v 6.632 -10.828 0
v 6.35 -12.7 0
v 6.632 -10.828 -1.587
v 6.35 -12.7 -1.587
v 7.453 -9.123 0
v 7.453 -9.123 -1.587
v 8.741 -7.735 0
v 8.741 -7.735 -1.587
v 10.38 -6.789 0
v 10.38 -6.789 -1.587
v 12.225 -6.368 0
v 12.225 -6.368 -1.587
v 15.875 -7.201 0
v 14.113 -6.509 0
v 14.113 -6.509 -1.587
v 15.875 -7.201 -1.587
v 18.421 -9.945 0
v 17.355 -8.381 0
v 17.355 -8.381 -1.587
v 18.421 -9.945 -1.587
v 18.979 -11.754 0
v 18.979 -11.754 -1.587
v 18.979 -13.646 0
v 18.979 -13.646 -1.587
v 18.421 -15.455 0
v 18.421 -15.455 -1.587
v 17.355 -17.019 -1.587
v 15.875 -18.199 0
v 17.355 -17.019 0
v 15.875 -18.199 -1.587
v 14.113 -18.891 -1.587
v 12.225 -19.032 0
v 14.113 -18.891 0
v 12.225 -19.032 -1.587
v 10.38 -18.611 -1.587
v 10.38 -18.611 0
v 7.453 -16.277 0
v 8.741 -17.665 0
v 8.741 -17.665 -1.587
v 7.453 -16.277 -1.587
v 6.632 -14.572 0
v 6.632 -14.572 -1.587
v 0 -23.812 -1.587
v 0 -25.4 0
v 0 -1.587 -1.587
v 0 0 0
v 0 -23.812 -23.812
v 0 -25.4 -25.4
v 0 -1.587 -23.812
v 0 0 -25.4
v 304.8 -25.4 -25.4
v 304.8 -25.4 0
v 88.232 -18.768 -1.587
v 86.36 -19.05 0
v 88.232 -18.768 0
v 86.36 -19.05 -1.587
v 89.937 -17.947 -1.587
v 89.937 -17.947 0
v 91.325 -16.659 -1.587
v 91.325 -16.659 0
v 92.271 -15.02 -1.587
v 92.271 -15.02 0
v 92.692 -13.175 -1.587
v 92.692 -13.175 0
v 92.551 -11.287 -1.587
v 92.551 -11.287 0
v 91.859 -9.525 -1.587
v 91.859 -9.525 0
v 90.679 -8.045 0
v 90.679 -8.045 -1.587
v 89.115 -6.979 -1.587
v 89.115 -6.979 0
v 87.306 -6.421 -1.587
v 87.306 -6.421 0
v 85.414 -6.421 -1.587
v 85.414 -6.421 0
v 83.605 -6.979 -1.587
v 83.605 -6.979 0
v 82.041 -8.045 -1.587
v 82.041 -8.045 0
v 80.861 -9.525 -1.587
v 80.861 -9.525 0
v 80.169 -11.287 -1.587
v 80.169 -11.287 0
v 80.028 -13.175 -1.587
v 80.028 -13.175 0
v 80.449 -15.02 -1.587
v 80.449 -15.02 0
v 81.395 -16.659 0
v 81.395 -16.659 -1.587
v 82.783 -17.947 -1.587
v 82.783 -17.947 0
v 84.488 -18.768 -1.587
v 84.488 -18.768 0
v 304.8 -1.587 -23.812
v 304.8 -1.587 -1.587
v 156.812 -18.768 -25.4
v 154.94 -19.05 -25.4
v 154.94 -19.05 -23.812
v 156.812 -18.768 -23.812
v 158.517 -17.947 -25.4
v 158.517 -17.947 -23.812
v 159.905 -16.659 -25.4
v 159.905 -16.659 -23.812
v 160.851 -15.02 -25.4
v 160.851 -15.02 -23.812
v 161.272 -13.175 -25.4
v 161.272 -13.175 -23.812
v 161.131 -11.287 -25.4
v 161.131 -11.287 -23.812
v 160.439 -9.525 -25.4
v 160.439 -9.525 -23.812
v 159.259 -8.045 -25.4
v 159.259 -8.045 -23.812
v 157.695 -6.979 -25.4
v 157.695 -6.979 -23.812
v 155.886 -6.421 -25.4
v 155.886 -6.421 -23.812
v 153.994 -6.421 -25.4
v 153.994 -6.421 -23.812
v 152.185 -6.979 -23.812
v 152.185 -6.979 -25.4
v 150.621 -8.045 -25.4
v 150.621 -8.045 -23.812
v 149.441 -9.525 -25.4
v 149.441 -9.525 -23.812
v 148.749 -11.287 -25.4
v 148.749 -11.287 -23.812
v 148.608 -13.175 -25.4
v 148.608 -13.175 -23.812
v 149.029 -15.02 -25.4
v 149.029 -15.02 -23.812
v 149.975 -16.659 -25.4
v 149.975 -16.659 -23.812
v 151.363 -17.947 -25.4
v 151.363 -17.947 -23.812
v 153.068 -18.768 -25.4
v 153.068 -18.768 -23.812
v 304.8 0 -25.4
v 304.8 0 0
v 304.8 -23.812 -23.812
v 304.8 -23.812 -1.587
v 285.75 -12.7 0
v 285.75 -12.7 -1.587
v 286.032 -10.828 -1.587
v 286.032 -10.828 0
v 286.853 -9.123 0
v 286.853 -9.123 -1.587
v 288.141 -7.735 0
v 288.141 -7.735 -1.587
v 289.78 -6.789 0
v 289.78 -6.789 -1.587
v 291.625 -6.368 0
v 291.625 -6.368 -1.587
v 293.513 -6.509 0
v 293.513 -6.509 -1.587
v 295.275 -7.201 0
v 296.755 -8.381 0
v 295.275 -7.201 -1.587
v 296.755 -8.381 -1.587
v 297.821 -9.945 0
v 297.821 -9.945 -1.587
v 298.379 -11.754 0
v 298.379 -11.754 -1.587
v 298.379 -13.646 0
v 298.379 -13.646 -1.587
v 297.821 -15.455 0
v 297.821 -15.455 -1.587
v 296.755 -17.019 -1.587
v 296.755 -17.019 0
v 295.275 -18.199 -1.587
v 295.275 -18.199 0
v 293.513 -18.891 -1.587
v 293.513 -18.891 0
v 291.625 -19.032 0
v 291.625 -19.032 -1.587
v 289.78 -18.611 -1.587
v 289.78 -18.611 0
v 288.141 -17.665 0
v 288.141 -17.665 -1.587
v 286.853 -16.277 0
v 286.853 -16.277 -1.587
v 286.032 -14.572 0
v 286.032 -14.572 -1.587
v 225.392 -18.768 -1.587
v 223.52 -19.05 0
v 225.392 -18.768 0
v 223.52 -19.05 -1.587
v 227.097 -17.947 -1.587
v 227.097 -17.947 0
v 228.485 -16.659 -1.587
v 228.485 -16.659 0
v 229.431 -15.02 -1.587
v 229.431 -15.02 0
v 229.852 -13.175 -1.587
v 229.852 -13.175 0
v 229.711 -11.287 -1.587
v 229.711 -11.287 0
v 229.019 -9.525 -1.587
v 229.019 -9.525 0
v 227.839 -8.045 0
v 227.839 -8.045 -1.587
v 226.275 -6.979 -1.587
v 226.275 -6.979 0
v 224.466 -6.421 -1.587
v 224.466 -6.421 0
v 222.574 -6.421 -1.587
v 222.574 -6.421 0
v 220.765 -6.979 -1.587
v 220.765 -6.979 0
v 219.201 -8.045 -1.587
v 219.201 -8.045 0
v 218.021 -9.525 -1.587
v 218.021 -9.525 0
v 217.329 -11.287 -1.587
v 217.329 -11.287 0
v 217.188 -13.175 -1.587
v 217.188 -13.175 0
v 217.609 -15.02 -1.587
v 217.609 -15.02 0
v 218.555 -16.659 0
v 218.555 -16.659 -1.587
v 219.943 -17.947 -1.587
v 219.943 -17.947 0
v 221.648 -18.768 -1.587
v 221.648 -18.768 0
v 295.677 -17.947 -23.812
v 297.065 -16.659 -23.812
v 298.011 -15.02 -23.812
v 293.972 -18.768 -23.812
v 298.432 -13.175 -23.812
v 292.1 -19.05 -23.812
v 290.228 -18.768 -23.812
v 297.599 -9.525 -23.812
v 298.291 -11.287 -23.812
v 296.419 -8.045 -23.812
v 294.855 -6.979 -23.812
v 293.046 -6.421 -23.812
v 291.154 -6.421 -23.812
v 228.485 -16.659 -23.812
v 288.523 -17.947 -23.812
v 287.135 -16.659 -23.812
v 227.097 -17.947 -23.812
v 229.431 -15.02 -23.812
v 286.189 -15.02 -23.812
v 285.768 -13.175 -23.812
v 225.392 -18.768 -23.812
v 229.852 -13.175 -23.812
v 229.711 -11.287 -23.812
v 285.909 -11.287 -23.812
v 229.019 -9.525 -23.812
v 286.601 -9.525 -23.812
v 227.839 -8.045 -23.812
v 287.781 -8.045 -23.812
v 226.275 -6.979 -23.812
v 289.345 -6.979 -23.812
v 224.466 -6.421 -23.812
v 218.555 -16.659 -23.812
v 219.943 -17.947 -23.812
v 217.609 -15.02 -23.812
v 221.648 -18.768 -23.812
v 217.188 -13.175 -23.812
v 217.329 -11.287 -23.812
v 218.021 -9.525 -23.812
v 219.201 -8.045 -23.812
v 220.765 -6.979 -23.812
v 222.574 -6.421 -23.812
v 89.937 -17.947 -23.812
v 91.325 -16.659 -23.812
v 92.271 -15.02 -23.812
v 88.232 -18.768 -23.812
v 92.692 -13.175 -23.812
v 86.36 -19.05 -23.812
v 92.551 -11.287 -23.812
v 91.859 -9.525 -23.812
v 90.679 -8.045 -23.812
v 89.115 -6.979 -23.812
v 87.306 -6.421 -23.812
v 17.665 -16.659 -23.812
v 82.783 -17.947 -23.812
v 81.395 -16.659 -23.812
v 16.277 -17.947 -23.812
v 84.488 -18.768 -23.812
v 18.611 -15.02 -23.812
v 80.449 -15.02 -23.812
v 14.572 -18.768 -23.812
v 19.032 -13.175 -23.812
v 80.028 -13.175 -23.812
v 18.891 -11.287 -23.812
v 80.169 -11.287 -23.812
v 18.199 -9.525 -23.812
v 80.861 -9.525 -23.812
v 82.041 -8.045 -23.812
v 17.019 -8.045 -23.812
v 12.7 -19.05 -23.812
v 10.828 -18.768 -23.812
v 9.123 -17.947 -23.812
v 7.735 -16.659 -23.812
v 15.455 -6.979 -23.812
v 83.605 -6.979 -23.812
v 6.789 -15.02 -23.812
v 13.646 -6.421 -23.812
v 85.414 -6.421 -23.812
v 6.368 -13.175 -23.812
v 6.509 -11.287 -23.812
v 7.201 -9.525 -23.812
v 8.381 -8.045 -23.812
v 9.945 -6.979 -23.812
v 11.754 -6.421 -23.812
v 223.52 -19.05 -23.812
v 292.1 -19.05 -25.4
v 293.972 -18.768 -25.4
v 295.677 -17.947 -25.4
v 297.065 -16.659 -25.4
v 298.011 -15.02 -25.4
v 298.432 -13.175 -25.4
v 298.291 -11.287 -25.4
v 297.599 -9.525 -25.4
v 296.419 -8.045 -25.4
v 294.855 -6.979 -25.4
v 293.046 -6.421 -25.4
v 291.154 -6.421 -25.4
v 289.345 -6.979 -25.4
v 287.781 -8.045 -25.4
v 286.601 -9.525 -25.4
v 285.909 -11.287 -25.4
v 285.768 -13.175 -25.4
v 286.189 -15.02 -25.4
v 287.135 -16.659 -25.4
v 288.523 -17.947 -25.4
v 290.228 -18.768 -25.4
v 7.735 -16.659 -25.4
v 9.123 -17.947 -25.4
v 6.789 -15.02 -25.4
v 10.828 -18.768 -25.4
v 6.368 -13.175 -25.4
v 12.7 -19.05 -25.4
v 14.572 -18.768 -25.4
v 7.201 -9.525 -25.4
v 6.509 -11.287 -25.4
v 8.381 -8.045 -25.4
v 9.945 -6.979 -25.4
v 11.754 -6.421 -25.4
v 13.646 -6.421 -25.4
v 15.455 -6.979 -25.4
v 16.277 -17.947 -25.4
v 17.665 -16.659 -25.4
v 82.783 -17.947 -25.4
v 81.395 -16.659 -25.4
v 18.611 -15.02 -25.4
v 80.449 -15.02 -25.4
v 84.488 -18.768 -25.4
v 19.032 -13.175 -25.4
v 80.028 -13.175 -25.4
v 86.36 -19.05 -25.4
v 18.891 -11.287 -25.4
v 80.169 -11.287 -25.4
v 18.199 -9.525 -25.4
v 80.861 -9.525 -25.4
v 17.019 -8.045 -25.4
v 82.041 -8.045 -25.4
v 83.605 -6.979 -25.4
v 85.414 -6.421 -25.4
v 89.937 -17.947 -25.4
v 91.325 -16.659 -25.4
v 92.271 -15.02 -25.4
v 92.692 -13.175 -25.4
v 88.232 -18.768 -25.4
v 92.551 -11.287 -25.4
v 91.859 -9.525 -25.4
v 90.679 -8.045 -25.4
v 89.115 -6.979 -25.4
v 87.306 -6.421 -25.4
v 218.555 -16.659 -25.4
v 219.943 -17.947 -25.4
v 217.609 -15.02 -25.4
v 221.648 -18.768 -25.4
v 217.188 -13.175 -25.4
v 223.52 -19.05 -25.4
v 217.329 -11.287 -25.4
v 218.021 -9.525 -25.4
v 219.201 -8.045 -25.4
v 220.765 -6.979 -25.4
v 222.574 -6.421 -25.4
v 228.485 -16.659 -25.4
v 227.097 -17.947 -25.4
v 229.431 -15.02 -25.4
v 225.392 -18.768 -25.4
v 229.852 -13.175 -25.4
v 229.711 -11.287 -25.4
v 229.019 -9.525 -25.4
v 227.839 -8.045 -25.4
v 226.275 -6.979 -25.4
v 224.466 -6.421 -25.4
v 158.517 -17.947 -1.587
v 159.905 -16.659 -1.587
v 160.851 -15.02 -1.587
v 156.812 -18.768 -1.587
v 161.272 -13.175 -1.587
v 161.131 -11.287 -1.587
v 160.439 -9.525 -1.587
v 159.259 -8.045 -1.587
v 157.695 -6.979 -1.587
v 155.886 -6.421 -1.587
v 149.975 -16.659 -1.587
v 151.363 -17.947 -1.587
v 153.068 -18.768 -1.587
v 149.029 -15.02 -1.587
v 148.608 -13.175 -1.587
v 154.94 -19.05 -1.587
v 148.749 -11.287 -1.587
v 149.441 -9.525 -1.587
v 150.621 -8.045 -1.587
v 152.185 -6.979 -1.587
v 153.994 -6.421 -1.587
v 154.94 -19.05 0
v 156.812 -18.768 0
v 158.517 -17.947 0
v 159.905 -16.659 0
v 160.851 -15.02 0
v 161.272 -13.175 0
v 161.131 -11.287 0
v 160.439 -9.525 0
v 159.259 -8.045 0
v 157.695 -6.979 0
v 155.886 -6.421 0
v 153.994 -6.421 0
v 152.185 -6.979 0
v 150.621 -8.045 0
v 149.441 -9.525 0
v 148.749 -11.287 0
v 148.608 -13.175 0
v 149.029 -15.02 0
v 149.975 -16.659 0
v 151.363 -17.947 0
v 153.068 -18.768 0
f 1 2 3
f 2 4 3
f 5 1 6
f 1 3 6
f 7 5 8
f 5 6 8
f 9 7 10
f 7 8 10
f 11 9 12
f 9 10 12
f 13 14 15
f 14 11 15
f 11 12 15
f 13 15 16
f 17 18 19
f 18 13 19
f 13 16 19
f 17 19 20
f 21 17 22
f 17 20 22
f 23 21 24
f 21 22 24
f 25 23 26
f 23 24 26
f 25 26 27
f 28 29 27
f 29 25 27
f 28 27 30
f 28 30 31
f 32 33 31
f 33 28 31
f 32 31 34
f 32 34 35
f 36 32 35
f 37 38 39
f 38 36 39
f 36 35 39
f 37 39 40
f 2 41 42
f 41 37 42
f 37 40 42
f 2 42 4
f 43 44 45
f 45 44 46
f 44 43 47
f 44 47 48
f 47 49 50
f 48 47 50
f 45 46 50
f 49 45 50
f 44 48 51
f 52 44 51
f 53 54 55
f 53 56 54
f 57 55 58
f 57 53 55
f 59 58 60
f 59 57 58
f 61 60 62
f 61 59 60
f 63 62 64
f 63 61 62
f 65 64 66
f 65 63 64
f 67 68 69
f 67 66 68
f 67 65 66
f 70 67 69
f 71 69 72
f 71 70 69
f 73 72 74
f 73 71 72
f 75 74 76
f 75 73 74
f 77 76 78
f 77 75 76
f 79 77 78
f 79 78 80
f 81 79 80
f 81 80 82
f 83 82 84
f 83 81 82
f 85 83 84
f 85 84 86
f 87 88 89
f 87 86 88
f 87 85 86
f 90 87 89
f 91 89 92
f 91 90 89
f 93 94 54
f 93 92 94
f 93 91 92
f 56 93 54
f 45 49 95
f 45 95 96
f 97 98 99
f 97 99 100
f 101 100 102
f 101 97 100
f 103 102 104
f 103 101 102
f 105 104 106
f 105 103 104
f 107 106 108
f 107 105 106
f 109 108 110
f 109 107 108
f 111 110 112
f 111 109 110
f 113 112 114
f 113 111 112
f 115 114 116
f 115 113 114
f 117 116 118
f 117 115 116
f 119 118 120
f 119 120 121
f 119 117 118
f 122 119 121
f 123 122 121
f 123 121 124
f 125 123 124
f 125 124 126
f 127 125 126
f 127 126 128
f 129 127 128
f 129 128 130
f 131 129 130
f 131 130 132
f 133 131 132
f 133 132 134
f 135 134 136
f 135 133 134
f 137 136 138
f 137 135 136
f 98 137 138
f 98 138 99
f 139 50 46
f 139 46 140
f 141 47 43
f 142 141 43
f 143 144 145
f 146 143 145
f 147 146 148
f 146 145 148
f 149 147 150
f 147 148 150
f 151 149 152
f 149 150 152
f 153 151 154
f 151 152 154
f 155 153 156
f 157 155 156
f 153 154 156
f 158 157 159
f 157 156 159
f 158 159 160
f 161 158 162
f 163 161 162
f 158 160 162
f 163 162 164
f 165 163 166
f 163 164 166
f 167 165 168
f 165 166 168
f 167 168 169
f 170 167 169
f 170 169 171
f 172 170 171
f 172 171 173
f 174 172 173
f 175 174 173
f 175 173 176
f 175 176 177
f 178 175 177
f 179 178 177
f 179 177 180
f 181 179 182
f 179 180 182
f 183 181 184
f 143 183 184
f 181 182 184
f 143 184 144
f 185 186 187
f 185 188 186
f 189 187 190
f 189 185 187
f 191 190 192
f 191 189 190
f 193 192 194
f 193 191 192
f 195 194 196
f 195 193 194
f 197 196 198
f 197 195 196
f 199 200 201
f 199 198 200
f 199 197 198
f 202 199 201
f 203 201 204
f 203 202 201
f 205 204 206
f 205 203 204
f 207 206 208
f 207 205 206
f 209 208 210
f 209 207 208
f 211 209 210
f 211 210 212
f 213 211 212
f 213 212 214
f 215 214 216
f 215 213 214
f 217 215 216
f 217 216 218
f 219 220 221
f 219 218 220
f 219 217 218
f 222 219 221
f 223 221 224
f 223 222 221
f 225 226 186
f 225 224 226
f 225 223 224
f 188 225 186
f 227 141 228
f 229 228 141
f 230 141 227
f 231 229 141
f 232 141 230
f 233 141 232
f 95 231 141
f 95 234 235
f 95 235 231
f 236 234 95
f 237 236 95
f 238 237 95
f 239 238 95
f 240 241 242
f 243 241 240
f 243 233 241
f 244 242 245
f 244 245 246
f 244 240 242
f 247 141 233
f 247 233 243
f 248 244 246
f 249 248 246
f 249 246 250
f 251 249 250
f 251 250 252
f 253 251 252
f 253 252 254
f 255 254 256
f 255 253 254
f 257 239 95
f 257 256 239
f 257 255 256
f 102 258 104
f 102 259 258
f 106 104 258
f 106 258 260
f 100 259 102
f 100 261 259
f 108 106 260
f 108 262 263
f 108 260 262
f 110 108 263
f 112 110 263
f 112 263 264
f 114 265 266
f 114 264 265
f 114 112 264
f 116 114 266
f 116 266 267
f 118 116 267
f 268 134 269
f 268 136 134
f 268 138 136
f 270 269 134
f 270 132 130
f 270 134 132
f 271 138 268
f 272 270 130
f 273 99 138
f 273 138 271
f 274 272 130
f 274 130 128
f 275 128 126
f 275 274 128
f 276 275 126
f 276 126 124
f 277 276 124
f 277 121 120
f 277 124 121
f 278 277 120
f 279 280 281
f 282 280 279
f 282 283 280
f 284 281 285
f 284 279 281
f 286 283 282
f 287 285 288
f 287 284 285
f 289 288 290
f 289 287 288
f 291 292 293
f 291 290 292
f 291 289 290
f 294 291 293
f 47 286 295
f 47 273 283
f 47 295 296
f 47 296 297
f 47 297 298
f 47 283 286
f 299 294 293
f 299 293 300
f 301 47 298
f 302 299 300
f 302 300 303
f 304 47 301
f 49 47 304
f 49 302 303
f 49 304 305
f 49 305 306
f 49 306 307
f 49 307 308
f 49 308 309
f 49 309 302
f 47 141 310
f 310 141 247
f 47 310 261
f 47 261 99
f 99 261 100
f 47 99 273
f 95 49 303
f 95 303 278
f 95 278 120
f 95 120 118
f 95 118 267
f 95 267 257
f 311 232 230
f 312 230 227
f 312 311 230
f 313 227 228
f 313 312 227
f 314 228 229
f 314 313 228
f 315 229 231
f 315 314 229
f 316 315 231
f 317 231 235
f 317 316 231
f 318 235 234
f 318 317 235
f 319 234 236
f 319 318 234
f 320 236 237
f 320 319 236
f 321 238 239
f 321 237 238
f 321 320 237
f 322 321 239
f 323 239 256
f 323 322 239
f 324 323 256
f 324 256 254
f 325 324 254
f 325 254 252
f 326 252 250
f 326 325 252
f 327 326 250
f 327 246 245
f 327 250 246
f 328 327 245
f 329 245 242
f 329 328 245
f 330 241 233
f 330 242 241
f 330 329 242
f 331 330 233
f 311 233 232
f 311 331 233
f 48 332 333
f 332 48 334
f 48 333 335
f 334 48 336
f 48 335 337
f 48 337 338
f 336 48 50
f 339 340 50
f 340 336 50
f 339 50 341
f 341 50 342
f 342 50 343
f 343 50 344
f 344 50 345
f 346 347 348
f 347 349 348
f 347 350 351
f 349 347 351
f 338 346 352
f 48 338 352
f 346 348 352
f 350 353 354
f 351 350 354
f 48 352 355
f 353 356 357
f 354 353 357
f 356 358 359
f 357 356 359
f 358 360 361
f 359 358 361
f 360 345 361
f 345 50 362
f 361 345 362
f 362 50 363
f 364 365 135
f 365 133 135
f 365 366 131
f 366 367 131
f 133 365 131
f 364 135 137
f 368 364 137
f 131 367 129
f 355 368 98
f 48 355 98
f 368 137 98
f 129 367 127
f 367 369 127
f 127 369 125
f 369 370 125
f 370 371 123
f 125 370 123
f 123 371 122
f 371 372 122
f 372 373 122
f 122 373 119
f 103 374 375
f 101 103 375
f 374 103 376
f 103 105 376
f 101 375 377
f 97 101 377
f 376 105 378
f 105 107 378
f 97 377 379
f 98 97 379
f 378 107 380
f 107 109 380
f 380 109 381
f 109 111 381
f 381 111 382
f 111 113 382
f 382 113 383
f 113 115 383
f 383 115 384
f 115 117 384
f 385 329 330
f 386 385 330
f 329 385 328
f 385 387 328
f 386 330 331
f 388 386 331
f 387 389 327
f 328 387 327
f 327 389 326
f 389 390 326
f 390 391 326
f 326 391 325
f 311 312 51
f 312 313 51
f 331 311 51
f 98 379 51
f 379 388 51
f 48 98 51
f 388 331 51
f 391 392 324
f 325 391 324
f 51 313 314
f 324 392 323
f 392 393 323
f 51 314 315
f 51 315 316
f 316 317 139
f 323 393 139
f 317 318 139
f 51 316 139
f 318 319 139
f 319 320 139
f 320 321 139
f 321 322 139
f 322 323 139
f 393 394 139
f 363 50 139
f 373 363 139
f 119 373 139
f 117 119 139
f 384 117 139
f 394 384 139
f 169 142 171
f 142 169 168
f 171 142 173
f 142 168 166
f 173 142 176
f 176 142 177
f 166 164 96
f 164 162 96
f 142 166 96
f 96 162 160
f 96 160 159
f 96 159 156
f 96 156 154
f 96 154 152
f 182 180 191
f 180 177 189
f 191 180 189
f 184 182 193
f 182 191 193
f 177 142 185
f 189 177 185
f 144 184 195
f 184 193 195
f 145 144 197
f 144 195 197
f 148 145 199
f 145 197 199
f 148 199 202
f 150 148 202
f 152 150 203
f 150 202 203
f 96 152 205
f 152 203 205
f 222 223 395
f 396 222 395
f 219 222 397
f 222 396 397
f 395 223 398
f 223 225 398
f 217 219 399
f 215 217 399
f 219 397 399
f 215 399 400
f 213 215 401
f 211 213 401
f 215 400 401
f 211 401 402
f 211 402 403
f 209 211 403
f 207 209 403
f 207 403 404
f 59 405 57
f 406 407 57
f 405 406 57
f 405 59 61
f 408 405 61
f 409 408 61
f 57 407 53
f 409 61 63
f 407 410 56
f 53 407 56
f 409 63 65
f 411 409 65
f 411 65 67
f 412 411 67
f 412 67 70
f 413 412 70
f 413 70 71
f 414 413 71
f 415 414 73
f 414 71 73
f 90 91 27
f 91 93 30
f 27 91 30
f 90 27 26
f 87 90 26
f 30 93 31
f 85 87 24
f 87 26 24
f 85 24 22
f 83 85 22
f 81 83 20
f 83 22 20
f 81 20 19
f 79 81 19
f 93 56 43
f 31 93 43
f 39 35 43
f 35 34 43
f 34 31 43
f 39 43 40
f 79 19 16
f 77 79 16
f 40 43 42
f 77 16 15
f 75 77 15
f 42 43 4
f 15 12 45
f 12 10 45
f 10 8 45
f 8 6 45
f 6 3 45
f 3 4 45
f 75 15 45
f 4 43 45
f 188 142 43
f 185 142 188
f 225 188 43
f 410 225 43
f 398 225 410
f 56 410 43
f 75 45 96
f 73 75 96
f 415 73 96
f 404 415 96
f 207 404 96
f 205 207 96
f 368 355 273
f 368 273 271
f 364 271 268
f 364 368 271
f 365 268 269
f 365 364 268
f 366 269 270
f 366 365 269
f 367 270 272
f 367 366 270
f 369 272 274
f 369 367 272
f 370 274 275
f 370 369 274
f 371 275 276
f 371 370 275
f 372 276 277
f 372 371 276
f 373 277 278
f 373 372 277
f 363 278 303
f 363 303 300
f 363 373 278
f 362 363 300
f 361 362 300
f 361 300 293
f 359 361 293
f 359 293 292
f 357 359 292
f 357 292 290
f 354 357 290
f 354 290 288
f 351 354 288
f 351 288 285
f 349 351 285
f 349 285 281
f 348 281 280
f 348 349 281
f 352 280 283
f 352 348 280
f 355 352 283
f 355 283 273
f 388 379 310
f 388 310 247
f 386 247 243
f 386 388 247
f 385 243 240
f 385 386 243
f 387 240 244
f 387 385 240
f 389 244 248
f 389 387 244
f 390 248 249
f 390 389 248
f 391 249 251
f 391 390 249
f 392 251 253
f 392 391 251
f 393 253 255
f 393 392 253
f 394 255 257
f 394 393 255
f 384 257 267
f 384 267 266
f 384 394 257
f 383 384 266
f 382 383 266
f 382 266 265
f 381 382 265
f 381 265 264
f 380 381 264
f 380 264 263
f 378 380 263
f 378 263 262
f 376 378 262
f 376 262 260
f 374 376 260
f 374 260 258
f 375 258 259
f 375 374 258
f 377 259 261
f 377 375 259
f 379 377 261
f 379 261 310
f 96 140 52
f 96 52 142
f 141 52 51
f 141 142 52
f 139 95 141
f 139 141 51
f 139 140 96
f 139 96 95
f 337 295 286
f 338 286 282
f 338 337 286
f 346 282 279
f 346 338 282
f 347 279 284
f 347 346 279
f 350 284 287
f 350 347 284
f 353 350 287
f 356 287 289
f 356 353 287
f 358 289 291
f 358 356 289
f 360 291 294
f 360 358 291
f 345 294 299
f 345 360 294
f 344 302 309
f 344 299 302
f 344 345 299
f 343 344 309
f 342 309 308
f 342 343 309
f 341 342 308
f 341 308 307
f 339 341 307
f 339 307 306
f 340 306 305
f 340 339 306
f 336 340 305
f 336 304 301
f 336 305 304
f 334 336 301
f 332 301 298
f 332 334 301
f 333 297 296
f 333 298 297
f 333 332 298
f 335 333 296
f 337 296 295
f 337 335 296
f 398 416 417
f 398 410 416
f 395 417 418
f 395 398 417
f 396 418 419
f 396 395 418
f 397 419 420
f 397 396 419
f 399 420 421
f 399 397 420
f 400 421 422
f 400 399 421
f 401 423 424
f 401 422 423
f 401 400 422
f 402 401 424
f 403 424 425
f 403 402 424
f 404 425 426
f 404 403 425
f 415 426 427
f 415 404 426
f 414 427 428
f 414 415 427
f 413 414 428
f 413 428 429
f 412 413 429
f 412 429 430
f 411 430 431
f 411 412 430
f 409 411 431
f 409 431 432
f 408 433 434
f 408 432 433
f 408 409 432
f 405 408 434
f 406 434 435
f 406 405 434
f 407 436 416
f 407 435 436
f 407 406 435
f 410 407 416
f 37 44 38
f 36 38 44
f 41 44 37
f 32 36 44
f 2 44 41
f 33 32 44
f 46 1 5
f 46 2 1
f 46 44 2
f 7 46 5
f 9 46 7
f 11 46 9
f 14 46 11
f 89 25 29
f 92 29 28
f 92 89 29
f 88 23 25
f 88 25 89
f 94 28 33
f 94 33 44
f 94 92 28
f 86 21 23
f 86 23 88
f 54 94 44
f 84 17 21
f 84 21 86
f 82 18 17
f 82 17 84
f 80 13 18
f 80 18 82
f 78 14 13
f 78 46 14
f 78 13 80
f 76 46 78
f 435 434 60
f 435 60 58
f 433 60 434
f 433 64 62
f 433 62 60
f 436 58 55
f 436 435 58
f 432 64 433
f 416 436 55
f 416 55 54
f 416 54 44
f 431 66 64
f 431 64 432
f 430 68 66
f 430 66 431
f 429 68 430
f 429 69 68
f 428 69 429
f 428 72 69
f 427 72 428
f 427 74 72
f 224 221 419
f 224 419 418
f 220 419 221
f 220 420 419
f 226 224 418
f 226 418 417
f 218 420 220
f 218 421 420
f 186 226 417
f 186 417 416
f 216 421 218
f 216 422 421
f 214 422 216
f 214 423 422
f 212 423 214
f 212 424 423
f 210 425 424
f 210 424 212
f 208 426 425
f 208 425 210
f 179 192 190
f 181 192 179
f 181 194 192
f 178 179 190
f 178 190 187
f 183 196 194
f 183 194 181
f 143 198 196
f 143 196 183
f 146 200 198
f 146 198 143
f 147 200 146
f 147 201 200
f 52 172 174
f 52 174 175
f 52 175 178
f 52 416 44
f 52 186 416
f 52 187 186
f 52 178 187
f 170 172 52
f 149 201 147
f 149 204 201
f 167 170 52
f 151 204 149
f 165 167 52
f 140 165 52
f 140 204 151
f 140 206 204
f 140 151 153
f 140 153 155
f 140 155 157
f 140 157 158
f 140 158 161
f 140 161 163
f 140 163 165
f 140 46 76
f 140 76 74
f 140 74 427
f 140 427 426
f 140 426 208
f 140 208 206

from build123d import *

# Parameters (mm, degrees)
SKETCH1_W                 = 304.8
SKETCH1_H                 = 25.4
BOSS_EXTRUDE1_DEPTH       = 25.4
SKETCH2_W                 = 22.225
SKETCH2_H                 = 22.225
CUT_EXTRUDE1_DEPTH        = 307.909367729
SKETCH3_W                 = 6.35
SKETCH3_H                 = 29.5275
HOLE1_AT_2_COUNT          = 2
HOLE1_AT_2_PITCH          = 279.4
HOLE2_D                   = 12.7
HOLE2_DEPTH               = 25.4
LPATTERN1_COUNT           = 2
LPATTERN1_PITCH           = 27.94
LPATTERN1_COUNT_DIR2      = 4
LPATTERN1_PITCH_DIR2      = 68.58
LPATTERN1_COPY_1_SKETCH_W = 6.35
LPATTERN1_COPY_1_SKETCH_H = 29.5275
LPATTERN1_COPY_2_SKETCH_W = 6.35
LPATTERN1_COPY_2_SKETCH_H = 29.5275
LPATTERN1_COPY_3_SKETCH_W = 6.35
LPATTERN1_COPY_3_SKETCH_H = 29.5275
LPATTERN1_COPY_4_SKETCH_W = 6.35
LPATTERN1_COPY_4_SKETCH_H = 29.5275
LPATTERN1_COPY_5_SKETCH_W = 6.35
LPATTERN1_COPY_5_SKETCH_H = 29.5275
LPATTERN1_COPY_6_SKETCH_W = 6.35
LPATTERN1_COPY_6_SKETCH_H = 29.5275
LPATTERN1_COPY_7_SKETCH_W = 6.35
LPATTERN1_COPY_7_SKETCH_H = 29.5275


with BuildPart() as part:
    # Sketch1 → Boss-Extrude1 (new body)
    with BuildSketch(Plane(origin=(0, 0, 0), x_dir=(1, 0, 0), z_dir=(0, 1, 0))):
        with Locations((152.4, 12.7)):
            Rectangle(SKETCH1_W, SKETCH1_H)
    extrude(amount=-BOSS_EXTRUDE1_DEPTH)

    # Sketch2 → Cut-Extrude1 (cut, through all)
    with BuildSketch(Plane.ZY):
        with Locations((-12.7, -12.7)):
            Rectangle(SKETCH2_W, SKETCH2_H)
    extrude(amount=-CUT_EXTRUDE1_DEPTH, mode=Mode.SUBTRACT)

    # Sketch3 → Hole1 (revolve, cut)
    with BuildSketch(Plane(origin=(292.1, -12.7, -23.8125), x_dir=(0, -1, 0), z_dir=(1, 0, 0))):
        with Locations((3.175, 14.76375)):
            Rectangle(SKETCH3_W, SKETCH3_H)
    hole1 = revolve(axis=Axis((292.1, -12.7, -133.8125), (0, 0, 1)), mode=Mode.SUBTRACT)

    # Hole1 at 2: Hole1 ×2
    with Locations(*[(-i * HOLE1_AT_2_PITCH, 0, 0) for i in range(1, HOLE1_AT_2_COUNT)]):
        add(hole1, mode=Mode.SUBTRACT)

    # Hole2
    with Locations(Plane.XY):
        with Locations((292.1, -12.7), (12.7, -12.7)):
            Hole(HOLE2_D / 2, depth=HOLE2_DEPTH)

    # LPattern1: Hole1 2 × 4
    with Locations(*[(-j * LPATTERN1_PITCH_DIR2, 0, i * LPATTERN1_PITCH) for i in range(LPATTERN1_COUNT) for j in range(LPATTERN1_COUNT_DIR2) if (i, j) != (0, 0)]):
        add(hole1, mode=Mode.SUBTRACT)

    # LPattern1 copy 1 sketch → LPattern1 copy 1 (revolve, cut)
    with BuildSketch(Plane(origin=(-55.88, -12.7, -23.8125), x_dir=(0, -1, 0), z_dir=(1, 0, 0))):
        with Locations((3.175, 14.76375)):
            Rectangle(LPATTERN1_COPY_1_SKETCH_W, LPATTERN1_COPY_1_SKETCH_H)
    revolve(axis=Axis((-55.88, -12.7, -133.8125), (0, 0, 1)), mode=Mode.SUBTRACT)

    # LPattern1 copy 2 sketch → LPattern1 copy 2 (revolve, cut)
    with BuildSketch(Plane(origin=(-124.46, -12.7, -23.8125), x_dir=(0, -1, 0), z_dir=(1, 0, 0))):
        with Locations((3.175, 14.76375)):
            Rectangle(LPATTERN1_COPY_2_SKETCH_W, LPATTERN1_COPY_2_SKETCH_H)
    revolve(axis=Axis((-124.46, -12.7, -133.8125), (0, 0, 1)), mode=Mode.SUBTRACT)

    # LPattern1 copy 3 sketch → LPattern1 copy 3 (revolve, cut)
    with BuildSketch(Plane(origin=(-193.04, -12.7, -23.8125), x_dir=(0, -1, 0), z_dir=(1, 0, 0))):
        with Locations((3.175, 14.76375)):
            Rectangle(LPATTERN1_COPY_3_SKETCH_W, LPATTERN1_COPY_3_SKETCH_H)
    revolve(axis=Axis((-193.04, -12.7, -133.8125), (0, 0, 1)), mode=Mode.SUBTRACT)

    # LPattern1 copy 4 sketch → LPattern1 copy 4 (revolve, cut)
    with BuildSketch(Plane(origin=(12.7, -12.7, 4.1275), x_dir=(0, -1, 0), z_dir=(1, 0, 0))):
        with Locations((3.175, 14.76375)):
            Rectangle(LPATTERN1_COPY_4_SKETCH_W, LPATTERN1_COPY_4_SKETCH_H)
    revolve(axis=Axis((12.7, -12.7, -105.8725), (0, 0, 1)), mode=Mode.SUBTRACT)

    # LPattern1 copy 5 sketch → LPattern1 copy 5 (revolve, cut)
    with BuildSketch(Plane(origin=(-55.88, -12.7, 4.1275), x_dir=(0, -1, 0), z_dir=(1, 0, 0))):
        with Locations((3.175, 14.76375)):
            Rectangle(LPATTERN1_COPY_5_SKETCH_W, LPATTERN1_COPY_5_SKETCH_H)
    revolve(axis=Axis((-55.88, -12.7, -105.8725), (0, 0, 1)), mode=Mode.SUBTRACT)

    # LPattern1 copy 6 sketch → LPattern1 copy 6 (revolve, cut)
    with BuildSketch(Plane(origin=(-124.46, -12.7, 4.1275), x_dir=(0, -1, 0), z_dir=(1, 0, 0))):
        with Locations((3.175, 14.76375)):
            Rectangle(LPATTERN1_COPY_6_SKETCH_W, LPATTERN1_COPY_6_SKETCH_H)
    revolve(axis=Axis((-124.46, -12.7, -105.8725), (0, 0, 1)), mode=Mode.SUBTRACT)

    # LPattern1 copy 7 sketch → LPattern1 copy 7 (revolve, cut)
    with BuildSketch(Plane(origin=(-193.04, -12.7, 4.1275), x_dir=(0, -1, 0), z_dir=(1, 0, 0))):
        with Locations((3.175, 14.76375)):
            Rectangle(LPATTERN1_COPY_7_SKETCH_W, LPATTERN1_COPY_7_SKETCH_H)
    revolve(axis=Axis((-193.04, -12.7, -105.8725), (0, 0, 1)), mode=Mode.SUBTRACT)


solid = part.part
